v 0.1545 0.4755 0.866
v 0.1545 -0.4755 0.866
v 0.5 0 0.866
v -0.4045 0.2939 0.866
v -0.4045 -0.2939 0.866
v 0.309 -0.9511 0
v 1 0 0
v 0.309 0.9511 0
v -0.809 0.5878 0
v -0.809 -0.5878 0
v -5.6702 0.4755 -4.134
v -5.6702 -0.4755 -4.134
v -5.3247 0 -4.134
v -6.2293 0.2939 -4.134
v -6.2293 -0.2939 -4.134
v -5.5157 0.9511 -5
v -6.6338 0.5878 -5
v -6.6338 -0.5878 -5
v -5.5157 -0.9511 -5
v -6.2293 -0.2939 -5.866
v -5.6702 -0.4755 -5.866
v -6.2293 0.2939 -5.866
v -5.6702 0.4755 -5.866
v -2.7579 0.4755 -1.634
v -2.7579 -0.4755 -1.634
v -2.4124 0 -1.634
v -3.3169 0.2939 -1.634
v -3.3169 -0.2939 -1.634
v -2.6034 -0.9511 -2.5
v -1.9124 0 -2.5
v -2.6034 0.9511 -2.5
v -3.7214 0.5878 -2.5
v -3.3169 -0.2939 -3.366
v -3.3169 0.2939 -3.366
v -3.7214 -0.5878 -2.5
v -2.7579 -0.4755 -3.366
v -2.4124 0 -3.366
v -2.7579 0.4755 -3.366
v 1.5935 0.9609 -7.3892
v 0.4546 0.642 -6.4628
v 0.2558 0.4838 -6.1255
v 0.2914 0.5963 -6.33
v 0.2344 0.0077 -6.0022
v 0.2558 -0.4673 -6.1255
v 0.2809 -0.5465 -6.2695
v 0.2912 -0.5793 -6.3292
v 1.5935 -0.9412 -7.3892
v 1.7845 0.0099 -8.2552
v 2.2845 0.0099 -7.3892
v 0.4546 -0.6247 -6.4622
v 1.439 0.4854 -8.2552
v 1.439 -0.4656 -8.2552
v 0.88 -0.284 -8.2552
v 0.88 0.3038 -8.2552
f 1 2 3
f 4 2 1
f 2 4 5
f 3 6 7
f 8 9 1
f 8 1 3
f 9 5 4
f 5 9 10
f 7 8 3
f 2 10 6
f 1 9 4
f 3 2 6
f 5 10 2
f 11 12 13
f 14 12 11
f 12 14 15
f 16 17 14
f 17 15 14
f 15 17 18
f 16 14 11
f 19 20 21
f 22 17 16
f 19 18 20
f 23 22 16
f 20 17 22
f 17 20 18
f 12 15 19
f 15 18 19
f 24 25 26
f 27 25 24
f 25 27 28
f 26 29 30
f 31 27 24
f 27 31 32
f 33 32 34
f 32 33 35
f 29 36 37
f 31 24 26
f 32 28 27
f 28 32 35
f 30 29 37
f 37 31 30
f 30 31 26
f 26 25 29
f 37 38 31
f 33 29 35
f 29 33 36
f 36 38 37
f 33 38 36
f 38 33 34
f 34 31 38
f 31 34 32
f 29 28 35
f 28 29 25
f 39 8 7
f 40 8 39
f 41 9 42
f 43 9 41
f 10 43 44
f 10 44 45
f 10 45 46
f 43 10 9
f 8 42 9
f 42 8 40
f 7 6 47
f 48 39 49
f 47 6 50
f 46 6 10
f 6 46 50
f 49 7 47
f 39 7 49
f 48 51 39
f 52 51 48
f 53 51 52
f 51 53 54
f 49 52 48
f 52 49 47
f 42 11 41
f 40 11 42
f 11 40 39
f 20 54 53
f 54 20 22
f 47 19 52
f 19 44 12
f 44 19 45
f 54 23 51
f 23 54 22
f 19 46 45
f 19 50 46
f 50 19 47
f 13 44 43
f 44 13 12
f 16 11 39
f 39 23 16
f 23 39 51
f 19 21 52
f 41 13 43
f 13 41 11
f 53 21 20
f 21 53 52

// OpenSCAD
function midpoint(start,end,bias=0.5) =start+(end*bias-start*(1-bias)); 
function len3(v)=sqrt(pow(v[0],2)+pow(v[1],2)+pow(v[2],2));
function un( v) = v / len3(v);
function mmul(v1,v2)=[v1[0]*v2[0],v1[1]*v2[1],v1[2]*v2[2]];

function IK (l,v)=sqrt(pow(l/2,2)-pow(len3(v)/2,2));
module draw(s,f,h){hull(){   translate(s)  sphere(h); translate(f)  sphere(h/2);}    }
sky=[1,0.001,0];
lookat=[0,0,1];
function flipxz(v)=un(cross(v,flipxy(v,sky)))*len3(v);// X flip blå
function flipxy(v)=un(cross(sky,v))*len3(v);// X flip GUL



a=[0,0,0];
b=[rands(-15,15,1)[0],0,-5];
//b=[5,5,10];
c=b/len3(b)*min(len3(b),14);

color("blue")translate(a)sphere();
translate(b)sphere();
color("blue")translate(pele(a,c,[0,0,0]))sphere();
end=c;
start=a;
echo(beckham(a,c,[0,5,0]));
echo(midpoint(start,end));
echo(
mmul(un(flipxy(end-start)),lookat)+
mmul(un(flipxz(end-start)),lookat)+
mmul(un(end-start),lookat));

//color("yellow")draw(midpoint(a,c),pele(a,c,[0,0,-5]));
//color("yellow")draw(a,pele(a,c,[0,0,-5]));
//color("yellow")draw(c,pele(a,c,[0,0,-5]));

color("yellow")draw(a,(beckham(a,c,15,lookat)));
color("yellow")draw(c,(beckham(a,c,15,lookat)));

circle(3);

function beckham(start,end,length=len3(b-a)*1.1,lookat=[0,1,0])=midpoint(start,end)+
un(flipxy(end-start))*un(lookat)[1]*IK(length,end-start)+
un(flipxz(end-start))*un(lookat)[2]*IK(length,end-start)+
un(end-start)*        un(lookat)[0]*IK(length,end-start) ;

function pele(start,end,lookat=[0,0,4])=midpoint(start,end)+
un(flipxy(end-start))*lookat[1]+
un(flipxz(end-start))*lookat[2]+
un(end-start)*lookat[0] ;
